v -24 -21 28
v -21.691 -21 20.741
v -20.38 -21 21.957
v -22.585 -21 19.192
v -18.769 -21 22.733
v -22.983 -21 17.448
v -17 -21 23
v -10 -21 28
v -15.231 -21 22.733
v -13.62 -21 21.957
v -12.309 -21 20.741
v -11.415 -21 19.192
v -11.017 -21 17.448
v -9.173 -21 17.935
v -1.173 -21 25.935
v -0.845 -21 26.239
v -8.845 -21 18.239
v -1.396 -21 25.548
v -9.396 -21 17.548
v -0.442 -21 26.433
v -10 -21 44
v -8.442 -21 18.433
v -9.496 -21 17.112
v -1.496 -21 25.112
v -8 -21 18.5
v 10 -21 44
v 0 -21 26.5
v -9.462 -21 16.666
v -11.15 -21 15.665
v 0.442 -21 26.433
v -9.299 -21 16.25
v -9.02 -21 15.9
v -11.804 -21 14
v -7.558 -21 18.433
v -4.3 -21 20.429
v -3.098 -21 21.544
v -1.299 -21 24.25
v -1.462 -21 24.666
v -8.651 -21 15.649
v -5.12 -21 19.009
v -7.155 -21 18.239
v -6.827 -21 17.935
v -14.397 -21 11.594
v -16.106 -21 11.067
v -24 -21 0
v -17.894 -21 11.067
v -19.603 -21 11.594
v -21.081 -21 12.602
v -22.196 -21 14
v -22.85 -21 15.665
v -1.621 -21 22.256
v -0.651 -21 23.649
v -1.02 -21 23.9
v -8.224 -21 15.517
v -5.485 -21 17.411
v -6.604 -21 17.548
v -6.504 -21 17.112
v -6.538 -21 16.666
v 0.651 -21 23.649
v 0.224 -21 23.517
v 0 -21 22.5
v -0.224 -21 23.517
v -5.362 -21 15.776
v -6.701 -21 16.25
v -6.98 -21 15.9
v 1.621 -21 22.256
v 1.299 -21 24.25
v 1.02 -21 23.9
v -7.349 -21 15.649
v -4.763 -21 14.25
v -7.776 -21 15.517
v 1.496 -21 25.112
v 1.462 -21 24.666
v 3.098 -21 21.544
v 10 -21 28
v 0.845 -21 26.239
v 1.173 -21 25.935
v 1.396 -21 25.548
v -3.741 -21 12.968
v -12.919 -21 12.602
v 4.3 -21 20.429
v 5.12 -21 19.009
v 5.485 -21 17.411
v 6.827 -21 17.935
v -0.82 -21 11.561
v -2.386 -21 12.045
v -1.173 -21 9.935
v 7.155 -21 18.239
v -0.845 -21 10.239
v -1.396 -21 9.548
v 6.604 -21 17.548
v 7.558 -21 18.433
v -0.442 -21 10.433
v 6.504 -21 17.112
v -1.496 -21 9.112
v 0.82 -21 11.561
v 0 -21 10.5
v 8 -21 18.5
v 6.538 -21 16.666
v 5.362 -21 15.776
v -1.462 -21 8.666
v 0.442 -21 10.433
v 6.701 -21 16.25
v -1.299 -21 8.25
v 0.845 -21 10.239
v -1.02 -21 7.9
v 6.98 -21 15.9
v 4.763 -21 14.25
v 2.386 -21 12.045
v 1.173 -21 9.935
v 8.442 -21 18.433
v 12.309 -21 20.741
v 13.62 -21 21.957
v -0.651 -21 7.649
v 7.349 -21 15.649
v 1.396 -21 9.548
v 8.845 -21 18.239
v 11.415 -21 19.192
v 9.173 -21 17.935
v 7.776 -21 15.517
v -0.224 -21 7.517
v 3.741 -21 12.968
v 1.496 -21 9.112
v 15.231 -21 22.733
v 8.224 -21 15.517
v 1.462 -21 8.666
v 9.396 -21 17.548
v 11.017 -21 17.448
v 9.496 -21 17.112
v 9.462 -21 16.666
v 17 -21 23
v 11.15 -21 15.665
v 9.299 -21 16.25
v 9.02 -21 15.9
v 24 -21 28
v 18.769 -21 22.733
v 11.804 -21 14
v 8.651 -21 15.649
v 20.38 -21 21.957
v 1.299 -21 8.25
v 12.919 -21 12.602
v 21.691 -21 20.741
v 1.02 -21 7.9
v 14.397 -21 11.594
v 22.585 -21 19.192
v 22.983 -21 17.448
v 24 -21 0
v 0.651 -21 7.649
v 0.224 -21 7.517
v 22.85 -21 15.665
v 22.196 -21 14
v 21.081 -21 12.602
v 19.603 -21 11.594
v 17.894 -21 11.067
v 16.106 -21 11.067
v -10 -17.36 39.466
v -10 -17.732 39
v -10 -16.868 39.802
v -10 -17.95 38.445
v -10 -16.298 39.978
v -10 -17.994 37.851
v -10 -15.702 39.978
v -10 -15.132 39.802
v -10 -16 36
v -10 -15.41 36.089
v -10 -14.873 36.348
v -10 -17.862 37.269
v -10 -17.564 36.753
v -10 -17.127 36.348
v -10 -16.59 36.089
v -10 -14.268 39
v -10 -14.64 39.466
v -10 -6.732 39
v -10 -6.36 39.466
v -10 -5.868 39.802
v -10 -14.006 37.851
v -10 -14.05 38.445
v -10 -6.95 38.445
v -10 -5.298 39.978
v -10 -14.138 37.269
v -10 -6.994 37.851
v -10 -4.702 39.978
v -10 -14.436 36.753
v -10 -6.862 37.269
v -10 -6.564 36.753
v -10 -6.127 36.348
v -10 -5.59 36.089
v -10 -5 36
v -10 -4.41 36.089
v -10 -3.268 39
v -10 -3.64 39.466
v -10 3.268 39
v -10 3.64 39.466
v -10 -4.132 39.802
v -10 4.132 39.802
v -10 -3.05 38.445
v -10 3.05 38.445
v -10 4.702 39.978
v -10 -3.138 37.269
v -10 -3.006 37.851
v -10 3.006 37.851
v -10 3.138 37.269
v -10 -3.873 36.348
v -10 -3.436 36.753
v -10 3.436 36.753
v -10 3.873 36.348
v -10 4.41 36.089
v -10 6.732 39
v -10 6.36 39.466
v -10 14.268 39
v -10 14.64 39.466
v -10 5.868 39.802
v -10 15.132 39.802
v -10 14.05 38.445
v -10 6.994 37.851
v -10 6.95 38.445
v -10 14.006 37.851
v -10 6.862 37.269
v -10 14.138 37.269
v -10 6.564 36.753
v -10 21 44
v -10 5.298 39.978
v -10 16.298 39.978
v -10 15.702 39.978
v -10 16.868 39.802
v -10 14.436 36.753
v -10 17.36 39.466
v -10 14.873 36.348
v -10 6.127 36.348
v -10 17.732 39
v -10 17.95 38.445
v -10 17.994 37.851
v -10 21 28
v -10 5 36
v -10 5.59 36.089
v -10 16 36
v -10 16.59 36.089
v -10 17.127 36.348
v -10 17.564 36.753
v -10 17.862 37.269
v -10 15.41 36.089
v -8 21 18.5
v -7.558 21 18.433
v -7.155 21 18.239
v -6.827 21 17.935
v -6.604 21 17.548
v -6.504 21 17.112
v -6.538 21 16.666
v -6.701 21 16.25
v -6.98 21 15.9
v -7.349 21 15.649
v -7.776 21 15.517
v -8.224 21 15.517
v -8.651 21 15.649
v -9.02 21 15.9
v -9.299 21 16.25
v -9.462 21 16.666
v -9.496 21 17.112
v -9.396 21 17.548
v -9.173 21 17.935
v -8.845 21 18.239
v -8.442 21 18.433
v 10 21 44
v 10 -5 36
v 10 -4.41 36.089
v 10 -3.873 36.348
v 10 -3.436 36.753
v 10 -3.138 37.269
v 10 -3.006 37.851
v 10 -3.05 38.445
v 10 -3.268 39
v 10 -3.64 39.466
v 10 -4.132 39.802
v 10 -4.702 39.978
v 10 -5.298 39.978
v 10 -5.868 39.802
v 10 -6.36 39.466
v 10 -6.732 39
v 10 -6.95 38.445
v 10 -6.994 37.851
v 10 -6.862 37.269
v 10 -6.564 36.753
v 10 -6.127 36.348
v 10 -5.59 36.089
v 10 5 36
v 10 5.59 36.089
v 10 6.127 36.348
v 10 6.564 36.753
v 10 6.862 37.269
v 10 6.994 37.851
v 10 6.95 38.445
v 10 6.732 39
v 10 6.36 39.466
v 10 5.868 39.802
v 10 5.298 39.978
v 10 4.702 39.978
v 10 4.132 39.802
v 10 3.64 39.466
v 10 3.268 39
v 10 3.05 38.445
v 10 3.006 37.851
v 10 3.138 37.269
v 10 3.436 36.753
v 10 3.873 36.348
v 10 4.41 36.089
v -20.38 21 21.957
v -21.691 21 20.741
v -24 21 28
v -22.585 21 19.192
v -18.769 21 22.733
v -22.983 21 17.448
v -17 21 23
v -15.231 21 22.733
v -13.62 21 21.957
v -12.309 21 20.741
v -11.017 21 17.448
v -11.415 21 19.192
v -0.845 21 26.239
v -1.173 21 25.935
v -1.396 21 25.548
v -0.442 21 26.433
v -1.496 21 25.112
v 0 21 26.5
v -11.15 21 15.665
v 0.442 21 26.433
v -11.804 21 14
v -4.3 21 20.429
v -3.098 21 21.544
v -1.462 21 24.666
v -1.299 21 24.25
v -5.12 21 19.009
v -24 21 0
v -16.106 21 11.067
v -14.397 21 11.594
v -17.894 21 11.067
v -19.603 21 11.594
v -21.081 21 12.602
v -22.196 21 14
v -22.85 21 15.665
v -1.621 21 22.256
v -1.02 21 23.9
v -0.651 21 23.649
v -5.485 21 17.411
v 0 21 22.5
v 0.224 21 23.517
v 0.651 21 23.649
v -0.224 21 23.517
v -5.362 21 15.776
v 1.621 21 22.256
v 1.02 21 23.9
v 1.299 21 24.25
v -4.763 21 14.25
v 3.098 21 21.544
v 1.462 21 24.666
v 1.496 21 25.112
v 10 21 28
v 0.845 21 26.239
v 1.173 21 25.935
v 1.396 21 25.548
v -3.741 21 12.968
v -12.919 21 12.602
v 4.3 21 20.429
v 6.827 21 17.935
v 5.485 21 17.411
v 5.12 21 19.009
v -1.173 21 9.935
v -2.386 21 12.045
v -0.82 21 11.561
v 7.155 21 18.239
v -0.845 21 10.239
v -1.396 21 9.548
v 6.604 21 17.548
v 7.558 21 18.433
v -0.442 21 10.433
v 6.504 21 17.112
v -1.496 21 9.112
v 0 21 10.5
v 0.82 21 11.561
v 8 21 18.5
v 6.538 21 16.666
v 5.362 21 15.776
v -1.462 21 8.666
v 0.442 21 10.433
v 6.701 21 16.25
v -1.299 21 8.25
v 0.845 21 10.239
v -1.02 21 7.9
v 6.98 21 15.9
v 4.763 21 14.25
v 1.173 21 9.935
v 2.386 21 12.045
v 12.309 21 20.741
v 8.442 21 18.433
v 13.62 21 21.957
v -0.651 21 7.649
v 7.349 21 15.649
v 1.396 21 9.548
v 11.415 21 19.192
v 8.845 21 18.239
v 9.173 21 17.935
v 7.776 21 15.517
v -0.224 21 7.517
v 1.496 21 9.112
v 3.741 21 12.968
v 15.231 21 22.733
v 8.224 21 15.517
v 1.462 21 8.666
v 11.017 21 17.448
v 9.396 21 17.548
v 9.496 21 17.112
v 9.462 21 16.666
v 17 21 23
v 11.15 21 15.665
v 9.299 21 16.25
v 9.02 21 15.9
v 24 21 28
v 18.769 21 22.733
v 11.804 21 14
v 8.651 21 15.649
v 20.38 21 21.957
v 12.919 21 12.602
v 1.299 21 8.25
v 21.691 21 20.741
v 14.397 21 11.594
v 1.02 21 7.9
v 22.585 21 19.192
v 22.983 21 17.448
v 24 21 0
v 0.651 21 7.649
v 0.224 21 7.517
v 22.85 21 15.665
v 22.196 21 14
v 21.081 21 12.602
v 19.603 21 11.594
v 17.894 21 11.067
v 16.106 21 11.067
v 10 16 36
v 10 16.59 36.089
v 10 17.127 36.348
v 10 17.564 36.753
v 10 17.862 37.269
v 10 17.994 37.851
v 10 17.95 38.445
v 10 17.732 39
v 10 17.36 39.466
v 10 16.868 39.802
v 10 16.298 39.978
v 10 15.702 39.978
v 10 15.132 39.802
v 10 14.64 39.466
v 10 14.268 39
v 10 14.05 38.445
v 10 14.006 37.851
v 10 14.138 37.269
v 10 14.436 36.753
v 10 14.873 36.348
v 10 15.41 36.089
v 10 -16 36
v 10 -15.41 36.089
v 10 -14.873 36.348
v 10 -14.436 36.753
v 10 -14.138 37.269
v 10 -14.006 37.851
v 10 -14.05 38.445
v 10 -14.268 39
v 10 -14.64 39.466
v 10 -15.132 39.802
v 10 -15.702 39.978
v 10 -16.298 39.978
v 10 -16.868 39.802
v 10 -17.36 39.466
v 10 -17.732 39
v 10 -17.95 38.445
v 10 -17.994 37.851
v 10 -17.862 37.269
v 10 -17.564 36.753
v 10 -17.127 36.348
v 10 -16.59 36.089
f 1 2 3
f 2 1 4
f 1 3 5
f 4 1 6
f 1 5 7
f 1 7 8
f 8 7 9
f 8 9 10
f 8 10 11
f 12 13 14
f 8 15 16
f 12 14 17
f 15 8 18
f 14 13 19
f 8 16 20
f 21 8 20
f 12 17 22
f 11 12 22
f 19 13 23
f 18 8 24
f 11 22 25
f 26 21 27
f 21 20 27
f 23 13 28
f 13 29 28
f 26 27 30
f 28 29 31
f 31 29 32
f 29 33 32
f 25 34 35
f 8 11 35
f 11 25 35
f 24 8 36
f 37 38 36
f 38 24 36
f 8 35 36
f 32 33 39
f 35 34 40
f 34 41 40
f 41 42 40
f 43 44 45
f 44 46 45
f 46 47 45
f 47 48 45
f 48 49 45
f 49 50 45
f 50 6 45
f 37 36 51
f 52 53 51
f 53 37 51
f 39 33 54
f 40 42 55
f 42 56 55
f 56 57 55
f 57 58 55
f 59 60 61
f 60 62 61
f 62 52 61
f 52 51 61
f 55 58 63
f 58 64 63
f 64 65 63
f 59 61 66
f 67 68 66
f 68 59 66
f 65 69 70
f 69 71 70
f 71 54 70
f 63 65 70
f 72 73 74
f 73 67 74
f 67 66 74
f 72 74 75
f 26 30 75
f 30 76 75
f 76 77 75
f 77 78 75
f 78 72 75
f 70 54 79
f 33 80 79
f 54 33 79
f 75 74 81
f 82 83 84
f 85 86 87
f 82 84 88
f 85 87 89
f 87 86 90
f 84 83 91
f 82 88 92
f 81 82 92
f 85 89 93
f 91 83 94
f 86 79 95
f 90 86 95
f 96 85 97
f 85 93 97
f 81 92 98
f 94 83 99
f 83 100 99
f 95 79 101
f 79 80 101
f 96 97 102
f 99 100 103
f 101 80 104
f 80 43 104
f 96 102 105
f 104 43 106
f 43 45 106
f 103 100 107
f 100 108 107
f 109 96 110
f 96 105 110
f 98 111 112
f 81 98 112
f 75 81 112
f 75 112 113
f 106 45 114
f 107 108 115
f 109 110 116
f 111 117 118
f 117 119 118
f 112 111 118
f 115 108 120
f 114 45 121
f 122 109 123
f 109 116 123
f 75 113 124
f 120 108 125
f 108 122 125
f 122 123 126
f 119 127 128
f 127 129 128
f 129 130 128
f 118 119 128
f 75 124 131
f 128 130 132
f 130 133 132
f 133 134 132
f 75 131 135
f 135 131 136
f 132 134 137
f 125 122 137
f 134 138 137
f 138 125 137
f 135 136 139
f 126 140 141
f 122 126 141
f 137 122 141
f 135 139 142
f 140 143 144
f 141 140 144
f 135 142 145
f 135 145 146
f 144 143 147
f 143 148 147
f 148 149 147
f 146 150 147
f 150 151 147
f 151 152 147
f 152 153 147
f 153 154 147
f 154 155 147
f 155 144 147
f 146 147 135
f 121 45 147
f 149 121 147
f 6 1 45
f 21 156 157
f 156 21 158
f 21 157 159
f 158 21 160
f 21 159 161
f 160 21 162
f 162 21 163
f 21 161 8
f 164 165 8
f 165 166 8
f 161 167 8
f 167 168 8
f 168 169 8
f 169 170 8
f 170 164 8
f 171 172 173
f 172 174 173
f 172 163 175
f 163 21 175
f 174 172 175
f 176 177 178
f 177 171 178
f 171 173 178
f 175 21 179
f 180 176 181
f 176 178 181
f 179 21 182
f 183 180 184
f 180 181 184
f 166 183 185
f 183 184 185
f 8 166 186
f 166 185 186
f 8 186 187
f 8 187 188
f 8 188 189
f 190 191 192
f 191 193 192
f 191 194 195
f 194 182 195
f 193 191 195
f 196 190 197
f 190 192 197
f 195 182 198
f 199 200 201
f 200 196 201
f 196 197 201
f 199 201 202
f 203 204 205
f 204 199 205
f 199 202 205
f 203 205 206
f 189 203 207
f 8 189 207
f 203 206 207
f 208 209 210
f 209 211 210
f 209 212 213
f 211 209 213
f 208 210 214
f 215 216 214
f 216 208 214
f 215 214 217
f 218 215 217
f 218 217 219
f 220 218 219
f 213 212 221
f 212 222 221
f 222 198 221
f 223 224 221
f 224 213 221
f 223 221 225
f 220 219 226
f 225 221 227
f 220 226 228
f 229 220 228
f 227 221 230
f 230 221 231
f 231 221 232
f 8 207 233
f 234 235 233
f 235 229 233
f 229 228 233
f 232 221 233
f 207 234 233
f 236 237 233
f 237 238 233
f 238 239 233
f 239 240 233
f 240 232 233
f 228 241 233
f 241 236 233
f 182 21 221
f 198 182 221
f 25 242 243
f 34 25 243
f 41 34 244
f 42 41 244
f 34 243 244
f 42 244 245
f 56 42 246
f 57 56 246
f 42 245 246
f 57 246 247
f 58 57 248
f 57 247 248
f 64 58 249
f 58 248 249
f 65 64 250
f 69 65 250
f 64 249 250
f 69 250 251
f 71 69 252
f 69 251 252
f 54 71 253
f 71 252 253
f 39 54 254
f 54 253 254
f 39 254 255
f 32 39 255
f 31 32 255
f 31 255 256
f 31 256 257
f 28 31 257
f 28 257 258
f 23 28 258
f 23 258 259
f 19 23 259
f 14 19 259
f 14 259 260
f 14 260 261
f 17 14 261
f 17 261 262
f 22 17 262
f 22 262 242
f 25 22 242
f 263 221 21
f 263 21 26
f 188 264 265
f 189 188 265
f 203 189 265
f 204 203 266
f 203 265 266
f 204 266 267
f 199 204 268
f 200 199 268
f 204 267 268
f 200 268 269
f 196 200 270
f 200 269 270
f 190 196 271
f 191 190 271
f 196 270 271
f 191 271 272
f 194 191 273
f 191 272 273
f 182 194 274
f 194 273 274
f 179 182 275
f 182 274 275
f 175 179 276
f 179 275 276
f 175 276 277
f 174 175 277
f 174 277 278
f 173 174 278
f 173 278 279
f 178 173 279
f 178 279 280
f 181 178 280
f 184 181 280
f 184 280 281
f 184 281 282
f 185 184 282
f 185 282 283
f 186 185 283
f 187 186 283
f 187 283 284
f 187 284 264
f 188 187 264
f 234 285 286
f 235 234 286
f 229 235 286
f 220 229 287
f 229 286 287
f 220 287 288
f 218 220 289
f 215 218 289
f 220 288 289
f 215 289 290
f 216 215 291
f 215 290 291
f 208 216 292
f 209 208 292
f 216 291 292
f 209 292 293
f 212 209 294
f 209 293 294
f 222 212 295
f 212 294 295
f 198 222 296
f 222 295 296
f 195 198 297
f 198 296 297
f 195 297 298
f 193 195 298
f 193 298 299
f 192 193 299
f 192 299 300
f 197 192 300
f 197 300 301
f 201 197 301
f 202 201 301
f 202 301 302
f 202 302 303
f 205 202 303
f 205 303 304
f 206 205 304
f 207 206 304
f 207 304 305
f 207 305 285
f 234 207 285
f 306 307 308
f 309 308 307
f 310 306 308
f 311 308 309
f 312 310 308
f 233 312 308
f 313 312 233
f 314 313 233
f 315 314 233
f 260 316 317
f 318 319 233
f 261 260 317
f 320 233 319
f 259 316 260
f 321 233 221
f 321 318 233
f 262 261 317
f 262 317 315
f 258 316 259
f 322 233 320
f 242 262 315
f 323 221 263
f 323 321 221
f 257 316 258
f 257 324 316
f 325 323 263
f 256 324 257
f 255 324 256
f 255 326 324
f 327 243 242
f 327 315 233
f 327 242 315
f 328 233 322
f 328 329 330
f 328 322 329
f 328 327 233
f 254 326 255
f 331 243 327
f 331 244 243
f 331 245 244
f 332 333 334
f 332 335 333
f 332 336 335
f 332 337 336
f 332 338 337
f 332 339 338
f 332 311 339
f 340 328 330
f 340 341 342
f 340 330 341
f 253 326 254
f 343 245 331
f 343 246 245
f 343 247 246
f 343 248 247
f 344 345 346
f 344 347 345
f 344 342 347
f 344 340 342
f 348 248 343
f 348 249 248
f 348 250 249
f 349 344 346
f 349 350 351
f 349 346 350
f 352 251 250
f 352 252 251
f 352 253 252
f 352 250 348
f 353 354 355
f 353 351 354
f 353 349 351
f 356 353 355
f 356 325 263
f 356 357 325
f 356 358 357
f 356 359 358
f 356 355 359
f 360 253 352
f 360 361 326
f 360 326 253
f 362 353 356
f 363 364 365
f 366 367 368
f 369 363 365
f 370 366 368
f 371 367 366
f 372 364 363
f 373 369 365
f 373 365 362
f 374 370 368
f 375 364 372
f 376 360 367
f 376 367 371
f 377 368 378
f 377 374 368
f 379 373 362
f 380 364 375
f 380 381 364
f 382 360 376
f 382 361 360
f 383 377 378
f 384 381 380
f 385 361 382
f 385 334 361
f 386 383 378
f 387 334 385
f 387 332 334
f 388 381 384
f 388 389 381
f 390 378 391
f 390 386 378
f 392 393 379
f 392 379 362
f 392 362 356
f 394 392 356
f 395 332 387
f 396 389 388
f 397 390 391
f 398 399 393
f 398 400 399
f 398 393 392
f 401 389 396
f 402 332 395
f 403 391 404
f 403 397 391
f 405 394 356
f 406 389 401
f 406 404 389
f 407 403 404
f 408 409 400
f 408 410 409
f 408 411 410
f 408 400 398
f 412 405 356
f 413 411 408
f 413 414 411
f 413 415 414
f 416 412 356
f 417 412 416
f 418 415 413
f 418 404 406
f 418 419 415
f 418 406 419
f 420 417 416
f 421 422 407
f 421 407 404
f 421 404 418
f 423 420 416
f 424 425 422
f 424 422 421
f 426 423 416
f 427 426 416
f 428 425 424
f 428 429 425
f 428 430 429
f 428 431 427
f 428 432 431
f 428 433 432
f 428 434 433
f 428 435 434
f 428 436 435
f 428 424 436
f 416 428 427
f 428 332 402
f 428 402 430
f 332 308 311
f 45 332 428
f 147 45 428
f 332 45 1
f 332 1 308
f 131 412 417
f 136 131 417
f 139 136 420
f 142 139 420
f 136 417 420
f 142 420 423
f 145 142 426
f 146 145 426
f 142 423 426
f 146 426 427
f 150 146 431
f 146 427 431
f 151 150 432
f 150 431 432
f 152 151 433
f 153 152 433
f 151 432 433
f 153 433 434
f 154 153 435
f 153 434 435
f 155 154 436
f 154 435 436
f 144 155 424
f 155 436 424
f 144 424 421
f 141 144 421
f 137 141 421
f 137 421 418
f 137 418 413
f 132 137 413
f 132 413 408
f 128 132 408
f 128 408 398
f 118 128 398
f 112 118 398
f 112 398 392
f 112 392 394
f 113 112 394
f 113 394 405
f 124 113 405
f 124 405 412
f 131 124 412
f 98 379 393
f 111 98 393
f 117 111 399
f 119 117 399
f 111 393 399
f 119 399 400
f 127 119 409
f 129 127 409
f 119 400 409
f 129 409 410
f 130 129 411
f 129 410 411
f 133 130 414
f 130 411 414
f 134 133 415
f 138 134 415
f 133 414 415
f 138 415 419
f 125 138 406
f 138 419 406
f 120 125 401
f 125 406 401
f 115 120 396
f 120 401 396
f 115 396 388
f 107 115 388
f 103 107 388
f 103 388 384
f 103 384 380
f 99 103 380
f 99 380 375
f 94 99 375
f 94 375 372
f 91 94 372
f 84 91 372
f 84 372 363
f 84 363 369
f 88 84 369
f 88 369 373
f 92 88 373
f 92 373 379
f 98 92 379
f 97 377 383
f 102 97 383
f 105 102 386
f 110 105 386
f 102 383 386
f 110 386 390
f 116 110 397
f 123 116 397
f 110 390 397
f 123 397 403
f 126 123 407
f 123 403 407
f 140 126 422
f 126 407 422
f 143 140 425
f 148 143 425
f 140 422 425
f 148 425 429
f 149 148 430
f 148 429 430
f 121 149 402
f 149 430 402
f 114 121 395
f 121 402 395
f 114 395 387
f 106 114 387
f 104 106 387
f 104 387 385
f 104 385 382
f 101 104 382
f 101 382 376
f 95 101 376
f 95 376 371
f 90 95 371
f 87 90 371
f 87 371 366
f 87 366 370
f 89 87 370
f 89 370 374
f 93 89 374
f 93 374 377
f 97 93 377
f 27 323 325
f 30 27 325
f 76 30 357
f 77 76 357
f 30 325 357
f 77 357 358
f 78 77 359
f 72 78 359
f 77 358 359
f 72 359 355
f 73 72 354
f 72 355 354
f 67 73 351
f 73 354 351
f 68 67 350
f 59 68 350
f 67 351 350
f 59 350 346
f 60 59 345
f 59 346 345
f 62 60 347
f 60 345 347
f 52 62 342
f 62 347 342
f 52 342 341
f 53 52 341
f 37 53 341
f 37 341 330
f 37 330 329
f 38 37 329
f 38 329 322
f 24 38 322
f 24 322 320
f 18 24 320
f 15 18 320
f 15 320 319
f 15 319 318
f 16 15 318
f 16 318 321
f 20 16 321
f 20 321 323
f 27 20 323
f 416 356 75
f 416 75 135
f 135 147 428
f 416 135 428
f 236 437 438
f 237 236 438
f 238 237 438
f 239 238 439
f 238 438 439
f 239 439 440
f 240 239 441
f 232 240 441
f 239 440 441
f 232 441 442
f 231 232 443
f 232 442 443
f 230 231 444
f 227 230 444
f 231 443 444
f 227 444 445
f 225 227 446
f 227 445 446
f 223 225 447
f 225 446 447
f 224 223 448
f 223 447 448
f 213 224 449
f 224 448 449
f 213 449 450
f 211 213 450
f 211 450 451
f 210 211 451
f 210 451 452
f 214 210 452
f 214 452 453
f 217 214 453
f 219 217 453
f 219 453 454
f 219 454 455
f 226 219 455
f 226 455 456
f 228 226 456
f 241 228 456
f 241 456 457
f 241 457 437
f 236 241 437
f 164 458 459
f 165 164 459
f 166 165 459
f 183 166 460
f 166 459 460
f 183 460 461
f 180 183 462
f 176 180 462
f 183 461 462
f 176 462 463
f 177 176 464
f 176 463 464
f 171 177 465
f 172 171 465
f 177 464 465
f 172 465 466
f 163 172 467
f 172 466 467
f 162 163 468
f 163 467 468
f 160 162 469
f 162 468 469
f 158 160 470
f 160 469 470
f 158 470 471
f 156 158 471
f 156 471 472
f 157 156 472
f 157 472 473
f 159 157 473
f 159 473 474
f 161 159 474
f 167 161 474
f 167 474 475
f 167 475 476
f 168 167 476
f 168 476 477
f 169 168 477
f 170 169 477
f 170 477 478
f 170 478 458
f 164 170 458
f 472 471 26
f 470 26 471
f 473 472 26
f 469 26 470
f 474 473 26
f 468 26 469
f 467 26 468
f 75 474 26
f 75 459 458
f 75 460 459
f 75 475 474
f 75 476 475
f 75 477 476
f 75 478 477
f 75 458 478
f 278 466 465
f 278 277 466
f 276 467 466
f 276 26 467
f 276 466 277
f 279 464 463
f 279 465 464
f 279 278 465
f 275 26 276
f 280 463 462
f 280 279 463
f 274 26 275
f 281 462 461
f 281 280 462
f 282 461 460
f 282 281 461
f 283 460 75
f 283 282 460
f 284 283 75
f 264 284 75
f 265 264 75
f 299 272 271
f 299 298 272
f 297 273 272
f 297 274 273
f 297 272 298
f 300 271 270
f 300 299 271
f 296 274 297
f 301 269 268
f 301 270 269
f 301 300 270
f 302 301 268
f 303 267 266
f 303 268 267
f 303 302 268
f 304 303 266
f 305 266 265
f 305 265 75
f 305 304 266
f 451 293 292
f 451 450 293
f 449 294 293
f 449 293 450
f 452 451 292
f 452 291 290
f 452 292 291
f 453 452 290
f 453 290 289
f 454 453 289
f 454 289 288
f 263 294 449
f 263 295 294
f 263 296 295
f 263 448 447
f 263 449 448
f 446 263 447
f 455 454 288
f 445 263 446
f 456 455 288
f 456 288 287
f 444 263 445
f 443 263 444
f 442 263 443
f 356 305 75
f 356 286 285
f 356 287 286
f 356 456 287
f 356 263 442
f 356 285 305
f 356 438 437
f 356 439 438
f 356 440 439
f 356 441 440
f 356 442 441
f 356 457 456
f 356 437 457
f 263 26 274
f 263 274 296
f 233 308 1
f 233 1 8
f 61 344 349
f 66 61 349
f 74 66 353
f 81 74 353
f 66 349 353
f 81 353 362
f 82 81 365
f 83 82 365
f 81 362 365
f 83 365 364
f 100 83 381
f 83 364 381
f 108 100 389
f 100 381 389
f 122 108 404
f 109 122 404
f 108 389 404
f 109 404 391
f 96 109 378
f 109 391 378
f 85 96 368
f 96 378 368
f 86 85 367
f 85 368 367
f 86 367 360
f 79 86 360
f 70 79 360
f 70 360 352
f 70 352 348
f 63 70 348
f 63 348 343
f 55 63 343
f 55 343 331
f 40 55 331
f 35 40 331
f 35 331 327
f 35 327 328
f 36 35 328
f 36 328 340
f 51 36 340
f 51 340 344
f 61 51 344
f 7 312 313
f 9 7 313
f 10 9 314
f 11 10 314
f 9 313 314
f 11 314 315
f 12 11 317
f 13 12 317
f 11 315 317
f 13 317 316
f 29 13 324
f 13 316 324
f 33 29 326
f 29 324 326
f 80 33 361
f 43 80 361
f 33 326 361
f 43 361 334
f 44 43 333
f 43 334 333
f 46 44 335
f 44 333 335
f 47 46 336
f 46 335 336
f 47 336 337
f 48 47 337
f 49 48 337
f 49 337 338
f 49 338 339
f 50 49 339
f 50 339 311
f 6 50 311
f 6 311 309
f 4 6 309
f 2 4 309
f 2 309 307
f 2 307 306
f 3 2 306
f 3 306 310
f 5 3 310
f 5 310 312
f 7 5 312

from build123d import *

# Parameters (mm, degrees)
SKETCH_1_W          = 48
SKETCH_1_H          = 42
EXTRUDE_1_DEPTH     = 38
SKETCH_3_R          = 6
SKETCH_3_R_2        = 5.5
SKETCH_3_R_3        = 1.5
CUT_EXTRUDE_2_DEPTH = 62.514225997
SKETCH_9_W          = 14
SKETCH_9_H          = 10
CUT_EXTRUDE_6_DEPTH = 62.514225997
SKETCH_10_W         = 20
SKETCH_10_H         = 6
EXTRUDE_3_DEPTH     = 42
SKETCH_11_R         = 2
CUT_EXTRUDE_7_DEPTH = 60.439044407


with BuildPart() as part:
    # 草圖1 → 填料-伸長1 (new body)
    with BuildSketch(Plane.XY):
        Rectangle(SKETCH_1_W, SKETCH_1_H)
    extrude(amount=EXTRUDE_1_DEPTH)

    # 草圖3 → 除料-伸長2 (cut, through all)
    with BuildSketch(Plane(origin=(0, 21, 0), x_dir=(1, 0, 0), z_dir=(0, 1, 0))):
        with Locations(Location((17, -17, 0), (0, 0, 270))):
            Circle(SKETCH_3_R)
        with Locations(Location((-17, -17, 0), (0, 0, 270))):
            Circle(SKETCH_3_R)
        with Locations(Location((0, -17, 0), (0, 0, 270))):
            Circle(SKETCH_3_R_2)
        with Locations(Location((0, -25, 0), (0, 0, 270))):
            Circle(SKETCH_3_R_3)
        with Locations(Location((8, -17, 0), (0, 0, 270))):
            Circle(SKETCH_3_R_3)
        with Locations(Location((0, -9, 0), (0, 0, 270))):
            Circle(SKETCH_3_R_3)
        with Locations(Location((-8, -17, 0), (0, 0, 270))):
            Circle(SKETCH_3_R_3)
    extrude(amount=-CUT_EXTRUDE_2_DEPTH, mode=Mode.SUBTRACT)

    # 草圖9 → 除料-伸長6 (cut, through all)
    with BuildSketch(Plane(origin=(0, 21, 0), x_dir=(1, 0, 0), z_dir=(0, 1, 0))):
        with Locations((-17, -33)):
            Rectangle(SKETCH_9_W, SKETCH_9_H)
        with Locations((17, -33)):
            Rectangle(SKETCH_9_W, SKETCH_9_H)
    extrude(amount=-CUT_EXTRUDE_6_DEPTH, mode=Mode.SUBTRACT)

    # 草圖10 → 填料-伸長3 (add)
    with BuildSketch(Plane(origin=(0, 21, 0), x_dir=(1, 0, 0), z_dir=(0, 1, 0))):
        with Locations((0, -41)):
            Rectangle(SKETCH_10_W, SKETCH_10_H)
    extrude(amount=-EXTRUDE_3_DEPTH)

    # 草圖11 → 除料-伸長7 (cut, through all)
    with BuildSketch(Plane(origin=(10, 0, 0), x_dir=(0, 0, -1), z_dir=(1, 0, 0))):
        with Locations((-38, 16)):
            Circle(SKETCH_11_R)
        with Locations((-38, 5)):
            Circle(SKETCH_11_R)
        with Locations((-38, -5)):
            Circle(SKETCH_11_R)
        with Locations((-38, -16)):
            Circle(SKETCH_11_R)
    extrude(amount=-CUT_EXTRUDE_7_DEPTH, mode=Mode.SUBTRACT)


solid = part.part
